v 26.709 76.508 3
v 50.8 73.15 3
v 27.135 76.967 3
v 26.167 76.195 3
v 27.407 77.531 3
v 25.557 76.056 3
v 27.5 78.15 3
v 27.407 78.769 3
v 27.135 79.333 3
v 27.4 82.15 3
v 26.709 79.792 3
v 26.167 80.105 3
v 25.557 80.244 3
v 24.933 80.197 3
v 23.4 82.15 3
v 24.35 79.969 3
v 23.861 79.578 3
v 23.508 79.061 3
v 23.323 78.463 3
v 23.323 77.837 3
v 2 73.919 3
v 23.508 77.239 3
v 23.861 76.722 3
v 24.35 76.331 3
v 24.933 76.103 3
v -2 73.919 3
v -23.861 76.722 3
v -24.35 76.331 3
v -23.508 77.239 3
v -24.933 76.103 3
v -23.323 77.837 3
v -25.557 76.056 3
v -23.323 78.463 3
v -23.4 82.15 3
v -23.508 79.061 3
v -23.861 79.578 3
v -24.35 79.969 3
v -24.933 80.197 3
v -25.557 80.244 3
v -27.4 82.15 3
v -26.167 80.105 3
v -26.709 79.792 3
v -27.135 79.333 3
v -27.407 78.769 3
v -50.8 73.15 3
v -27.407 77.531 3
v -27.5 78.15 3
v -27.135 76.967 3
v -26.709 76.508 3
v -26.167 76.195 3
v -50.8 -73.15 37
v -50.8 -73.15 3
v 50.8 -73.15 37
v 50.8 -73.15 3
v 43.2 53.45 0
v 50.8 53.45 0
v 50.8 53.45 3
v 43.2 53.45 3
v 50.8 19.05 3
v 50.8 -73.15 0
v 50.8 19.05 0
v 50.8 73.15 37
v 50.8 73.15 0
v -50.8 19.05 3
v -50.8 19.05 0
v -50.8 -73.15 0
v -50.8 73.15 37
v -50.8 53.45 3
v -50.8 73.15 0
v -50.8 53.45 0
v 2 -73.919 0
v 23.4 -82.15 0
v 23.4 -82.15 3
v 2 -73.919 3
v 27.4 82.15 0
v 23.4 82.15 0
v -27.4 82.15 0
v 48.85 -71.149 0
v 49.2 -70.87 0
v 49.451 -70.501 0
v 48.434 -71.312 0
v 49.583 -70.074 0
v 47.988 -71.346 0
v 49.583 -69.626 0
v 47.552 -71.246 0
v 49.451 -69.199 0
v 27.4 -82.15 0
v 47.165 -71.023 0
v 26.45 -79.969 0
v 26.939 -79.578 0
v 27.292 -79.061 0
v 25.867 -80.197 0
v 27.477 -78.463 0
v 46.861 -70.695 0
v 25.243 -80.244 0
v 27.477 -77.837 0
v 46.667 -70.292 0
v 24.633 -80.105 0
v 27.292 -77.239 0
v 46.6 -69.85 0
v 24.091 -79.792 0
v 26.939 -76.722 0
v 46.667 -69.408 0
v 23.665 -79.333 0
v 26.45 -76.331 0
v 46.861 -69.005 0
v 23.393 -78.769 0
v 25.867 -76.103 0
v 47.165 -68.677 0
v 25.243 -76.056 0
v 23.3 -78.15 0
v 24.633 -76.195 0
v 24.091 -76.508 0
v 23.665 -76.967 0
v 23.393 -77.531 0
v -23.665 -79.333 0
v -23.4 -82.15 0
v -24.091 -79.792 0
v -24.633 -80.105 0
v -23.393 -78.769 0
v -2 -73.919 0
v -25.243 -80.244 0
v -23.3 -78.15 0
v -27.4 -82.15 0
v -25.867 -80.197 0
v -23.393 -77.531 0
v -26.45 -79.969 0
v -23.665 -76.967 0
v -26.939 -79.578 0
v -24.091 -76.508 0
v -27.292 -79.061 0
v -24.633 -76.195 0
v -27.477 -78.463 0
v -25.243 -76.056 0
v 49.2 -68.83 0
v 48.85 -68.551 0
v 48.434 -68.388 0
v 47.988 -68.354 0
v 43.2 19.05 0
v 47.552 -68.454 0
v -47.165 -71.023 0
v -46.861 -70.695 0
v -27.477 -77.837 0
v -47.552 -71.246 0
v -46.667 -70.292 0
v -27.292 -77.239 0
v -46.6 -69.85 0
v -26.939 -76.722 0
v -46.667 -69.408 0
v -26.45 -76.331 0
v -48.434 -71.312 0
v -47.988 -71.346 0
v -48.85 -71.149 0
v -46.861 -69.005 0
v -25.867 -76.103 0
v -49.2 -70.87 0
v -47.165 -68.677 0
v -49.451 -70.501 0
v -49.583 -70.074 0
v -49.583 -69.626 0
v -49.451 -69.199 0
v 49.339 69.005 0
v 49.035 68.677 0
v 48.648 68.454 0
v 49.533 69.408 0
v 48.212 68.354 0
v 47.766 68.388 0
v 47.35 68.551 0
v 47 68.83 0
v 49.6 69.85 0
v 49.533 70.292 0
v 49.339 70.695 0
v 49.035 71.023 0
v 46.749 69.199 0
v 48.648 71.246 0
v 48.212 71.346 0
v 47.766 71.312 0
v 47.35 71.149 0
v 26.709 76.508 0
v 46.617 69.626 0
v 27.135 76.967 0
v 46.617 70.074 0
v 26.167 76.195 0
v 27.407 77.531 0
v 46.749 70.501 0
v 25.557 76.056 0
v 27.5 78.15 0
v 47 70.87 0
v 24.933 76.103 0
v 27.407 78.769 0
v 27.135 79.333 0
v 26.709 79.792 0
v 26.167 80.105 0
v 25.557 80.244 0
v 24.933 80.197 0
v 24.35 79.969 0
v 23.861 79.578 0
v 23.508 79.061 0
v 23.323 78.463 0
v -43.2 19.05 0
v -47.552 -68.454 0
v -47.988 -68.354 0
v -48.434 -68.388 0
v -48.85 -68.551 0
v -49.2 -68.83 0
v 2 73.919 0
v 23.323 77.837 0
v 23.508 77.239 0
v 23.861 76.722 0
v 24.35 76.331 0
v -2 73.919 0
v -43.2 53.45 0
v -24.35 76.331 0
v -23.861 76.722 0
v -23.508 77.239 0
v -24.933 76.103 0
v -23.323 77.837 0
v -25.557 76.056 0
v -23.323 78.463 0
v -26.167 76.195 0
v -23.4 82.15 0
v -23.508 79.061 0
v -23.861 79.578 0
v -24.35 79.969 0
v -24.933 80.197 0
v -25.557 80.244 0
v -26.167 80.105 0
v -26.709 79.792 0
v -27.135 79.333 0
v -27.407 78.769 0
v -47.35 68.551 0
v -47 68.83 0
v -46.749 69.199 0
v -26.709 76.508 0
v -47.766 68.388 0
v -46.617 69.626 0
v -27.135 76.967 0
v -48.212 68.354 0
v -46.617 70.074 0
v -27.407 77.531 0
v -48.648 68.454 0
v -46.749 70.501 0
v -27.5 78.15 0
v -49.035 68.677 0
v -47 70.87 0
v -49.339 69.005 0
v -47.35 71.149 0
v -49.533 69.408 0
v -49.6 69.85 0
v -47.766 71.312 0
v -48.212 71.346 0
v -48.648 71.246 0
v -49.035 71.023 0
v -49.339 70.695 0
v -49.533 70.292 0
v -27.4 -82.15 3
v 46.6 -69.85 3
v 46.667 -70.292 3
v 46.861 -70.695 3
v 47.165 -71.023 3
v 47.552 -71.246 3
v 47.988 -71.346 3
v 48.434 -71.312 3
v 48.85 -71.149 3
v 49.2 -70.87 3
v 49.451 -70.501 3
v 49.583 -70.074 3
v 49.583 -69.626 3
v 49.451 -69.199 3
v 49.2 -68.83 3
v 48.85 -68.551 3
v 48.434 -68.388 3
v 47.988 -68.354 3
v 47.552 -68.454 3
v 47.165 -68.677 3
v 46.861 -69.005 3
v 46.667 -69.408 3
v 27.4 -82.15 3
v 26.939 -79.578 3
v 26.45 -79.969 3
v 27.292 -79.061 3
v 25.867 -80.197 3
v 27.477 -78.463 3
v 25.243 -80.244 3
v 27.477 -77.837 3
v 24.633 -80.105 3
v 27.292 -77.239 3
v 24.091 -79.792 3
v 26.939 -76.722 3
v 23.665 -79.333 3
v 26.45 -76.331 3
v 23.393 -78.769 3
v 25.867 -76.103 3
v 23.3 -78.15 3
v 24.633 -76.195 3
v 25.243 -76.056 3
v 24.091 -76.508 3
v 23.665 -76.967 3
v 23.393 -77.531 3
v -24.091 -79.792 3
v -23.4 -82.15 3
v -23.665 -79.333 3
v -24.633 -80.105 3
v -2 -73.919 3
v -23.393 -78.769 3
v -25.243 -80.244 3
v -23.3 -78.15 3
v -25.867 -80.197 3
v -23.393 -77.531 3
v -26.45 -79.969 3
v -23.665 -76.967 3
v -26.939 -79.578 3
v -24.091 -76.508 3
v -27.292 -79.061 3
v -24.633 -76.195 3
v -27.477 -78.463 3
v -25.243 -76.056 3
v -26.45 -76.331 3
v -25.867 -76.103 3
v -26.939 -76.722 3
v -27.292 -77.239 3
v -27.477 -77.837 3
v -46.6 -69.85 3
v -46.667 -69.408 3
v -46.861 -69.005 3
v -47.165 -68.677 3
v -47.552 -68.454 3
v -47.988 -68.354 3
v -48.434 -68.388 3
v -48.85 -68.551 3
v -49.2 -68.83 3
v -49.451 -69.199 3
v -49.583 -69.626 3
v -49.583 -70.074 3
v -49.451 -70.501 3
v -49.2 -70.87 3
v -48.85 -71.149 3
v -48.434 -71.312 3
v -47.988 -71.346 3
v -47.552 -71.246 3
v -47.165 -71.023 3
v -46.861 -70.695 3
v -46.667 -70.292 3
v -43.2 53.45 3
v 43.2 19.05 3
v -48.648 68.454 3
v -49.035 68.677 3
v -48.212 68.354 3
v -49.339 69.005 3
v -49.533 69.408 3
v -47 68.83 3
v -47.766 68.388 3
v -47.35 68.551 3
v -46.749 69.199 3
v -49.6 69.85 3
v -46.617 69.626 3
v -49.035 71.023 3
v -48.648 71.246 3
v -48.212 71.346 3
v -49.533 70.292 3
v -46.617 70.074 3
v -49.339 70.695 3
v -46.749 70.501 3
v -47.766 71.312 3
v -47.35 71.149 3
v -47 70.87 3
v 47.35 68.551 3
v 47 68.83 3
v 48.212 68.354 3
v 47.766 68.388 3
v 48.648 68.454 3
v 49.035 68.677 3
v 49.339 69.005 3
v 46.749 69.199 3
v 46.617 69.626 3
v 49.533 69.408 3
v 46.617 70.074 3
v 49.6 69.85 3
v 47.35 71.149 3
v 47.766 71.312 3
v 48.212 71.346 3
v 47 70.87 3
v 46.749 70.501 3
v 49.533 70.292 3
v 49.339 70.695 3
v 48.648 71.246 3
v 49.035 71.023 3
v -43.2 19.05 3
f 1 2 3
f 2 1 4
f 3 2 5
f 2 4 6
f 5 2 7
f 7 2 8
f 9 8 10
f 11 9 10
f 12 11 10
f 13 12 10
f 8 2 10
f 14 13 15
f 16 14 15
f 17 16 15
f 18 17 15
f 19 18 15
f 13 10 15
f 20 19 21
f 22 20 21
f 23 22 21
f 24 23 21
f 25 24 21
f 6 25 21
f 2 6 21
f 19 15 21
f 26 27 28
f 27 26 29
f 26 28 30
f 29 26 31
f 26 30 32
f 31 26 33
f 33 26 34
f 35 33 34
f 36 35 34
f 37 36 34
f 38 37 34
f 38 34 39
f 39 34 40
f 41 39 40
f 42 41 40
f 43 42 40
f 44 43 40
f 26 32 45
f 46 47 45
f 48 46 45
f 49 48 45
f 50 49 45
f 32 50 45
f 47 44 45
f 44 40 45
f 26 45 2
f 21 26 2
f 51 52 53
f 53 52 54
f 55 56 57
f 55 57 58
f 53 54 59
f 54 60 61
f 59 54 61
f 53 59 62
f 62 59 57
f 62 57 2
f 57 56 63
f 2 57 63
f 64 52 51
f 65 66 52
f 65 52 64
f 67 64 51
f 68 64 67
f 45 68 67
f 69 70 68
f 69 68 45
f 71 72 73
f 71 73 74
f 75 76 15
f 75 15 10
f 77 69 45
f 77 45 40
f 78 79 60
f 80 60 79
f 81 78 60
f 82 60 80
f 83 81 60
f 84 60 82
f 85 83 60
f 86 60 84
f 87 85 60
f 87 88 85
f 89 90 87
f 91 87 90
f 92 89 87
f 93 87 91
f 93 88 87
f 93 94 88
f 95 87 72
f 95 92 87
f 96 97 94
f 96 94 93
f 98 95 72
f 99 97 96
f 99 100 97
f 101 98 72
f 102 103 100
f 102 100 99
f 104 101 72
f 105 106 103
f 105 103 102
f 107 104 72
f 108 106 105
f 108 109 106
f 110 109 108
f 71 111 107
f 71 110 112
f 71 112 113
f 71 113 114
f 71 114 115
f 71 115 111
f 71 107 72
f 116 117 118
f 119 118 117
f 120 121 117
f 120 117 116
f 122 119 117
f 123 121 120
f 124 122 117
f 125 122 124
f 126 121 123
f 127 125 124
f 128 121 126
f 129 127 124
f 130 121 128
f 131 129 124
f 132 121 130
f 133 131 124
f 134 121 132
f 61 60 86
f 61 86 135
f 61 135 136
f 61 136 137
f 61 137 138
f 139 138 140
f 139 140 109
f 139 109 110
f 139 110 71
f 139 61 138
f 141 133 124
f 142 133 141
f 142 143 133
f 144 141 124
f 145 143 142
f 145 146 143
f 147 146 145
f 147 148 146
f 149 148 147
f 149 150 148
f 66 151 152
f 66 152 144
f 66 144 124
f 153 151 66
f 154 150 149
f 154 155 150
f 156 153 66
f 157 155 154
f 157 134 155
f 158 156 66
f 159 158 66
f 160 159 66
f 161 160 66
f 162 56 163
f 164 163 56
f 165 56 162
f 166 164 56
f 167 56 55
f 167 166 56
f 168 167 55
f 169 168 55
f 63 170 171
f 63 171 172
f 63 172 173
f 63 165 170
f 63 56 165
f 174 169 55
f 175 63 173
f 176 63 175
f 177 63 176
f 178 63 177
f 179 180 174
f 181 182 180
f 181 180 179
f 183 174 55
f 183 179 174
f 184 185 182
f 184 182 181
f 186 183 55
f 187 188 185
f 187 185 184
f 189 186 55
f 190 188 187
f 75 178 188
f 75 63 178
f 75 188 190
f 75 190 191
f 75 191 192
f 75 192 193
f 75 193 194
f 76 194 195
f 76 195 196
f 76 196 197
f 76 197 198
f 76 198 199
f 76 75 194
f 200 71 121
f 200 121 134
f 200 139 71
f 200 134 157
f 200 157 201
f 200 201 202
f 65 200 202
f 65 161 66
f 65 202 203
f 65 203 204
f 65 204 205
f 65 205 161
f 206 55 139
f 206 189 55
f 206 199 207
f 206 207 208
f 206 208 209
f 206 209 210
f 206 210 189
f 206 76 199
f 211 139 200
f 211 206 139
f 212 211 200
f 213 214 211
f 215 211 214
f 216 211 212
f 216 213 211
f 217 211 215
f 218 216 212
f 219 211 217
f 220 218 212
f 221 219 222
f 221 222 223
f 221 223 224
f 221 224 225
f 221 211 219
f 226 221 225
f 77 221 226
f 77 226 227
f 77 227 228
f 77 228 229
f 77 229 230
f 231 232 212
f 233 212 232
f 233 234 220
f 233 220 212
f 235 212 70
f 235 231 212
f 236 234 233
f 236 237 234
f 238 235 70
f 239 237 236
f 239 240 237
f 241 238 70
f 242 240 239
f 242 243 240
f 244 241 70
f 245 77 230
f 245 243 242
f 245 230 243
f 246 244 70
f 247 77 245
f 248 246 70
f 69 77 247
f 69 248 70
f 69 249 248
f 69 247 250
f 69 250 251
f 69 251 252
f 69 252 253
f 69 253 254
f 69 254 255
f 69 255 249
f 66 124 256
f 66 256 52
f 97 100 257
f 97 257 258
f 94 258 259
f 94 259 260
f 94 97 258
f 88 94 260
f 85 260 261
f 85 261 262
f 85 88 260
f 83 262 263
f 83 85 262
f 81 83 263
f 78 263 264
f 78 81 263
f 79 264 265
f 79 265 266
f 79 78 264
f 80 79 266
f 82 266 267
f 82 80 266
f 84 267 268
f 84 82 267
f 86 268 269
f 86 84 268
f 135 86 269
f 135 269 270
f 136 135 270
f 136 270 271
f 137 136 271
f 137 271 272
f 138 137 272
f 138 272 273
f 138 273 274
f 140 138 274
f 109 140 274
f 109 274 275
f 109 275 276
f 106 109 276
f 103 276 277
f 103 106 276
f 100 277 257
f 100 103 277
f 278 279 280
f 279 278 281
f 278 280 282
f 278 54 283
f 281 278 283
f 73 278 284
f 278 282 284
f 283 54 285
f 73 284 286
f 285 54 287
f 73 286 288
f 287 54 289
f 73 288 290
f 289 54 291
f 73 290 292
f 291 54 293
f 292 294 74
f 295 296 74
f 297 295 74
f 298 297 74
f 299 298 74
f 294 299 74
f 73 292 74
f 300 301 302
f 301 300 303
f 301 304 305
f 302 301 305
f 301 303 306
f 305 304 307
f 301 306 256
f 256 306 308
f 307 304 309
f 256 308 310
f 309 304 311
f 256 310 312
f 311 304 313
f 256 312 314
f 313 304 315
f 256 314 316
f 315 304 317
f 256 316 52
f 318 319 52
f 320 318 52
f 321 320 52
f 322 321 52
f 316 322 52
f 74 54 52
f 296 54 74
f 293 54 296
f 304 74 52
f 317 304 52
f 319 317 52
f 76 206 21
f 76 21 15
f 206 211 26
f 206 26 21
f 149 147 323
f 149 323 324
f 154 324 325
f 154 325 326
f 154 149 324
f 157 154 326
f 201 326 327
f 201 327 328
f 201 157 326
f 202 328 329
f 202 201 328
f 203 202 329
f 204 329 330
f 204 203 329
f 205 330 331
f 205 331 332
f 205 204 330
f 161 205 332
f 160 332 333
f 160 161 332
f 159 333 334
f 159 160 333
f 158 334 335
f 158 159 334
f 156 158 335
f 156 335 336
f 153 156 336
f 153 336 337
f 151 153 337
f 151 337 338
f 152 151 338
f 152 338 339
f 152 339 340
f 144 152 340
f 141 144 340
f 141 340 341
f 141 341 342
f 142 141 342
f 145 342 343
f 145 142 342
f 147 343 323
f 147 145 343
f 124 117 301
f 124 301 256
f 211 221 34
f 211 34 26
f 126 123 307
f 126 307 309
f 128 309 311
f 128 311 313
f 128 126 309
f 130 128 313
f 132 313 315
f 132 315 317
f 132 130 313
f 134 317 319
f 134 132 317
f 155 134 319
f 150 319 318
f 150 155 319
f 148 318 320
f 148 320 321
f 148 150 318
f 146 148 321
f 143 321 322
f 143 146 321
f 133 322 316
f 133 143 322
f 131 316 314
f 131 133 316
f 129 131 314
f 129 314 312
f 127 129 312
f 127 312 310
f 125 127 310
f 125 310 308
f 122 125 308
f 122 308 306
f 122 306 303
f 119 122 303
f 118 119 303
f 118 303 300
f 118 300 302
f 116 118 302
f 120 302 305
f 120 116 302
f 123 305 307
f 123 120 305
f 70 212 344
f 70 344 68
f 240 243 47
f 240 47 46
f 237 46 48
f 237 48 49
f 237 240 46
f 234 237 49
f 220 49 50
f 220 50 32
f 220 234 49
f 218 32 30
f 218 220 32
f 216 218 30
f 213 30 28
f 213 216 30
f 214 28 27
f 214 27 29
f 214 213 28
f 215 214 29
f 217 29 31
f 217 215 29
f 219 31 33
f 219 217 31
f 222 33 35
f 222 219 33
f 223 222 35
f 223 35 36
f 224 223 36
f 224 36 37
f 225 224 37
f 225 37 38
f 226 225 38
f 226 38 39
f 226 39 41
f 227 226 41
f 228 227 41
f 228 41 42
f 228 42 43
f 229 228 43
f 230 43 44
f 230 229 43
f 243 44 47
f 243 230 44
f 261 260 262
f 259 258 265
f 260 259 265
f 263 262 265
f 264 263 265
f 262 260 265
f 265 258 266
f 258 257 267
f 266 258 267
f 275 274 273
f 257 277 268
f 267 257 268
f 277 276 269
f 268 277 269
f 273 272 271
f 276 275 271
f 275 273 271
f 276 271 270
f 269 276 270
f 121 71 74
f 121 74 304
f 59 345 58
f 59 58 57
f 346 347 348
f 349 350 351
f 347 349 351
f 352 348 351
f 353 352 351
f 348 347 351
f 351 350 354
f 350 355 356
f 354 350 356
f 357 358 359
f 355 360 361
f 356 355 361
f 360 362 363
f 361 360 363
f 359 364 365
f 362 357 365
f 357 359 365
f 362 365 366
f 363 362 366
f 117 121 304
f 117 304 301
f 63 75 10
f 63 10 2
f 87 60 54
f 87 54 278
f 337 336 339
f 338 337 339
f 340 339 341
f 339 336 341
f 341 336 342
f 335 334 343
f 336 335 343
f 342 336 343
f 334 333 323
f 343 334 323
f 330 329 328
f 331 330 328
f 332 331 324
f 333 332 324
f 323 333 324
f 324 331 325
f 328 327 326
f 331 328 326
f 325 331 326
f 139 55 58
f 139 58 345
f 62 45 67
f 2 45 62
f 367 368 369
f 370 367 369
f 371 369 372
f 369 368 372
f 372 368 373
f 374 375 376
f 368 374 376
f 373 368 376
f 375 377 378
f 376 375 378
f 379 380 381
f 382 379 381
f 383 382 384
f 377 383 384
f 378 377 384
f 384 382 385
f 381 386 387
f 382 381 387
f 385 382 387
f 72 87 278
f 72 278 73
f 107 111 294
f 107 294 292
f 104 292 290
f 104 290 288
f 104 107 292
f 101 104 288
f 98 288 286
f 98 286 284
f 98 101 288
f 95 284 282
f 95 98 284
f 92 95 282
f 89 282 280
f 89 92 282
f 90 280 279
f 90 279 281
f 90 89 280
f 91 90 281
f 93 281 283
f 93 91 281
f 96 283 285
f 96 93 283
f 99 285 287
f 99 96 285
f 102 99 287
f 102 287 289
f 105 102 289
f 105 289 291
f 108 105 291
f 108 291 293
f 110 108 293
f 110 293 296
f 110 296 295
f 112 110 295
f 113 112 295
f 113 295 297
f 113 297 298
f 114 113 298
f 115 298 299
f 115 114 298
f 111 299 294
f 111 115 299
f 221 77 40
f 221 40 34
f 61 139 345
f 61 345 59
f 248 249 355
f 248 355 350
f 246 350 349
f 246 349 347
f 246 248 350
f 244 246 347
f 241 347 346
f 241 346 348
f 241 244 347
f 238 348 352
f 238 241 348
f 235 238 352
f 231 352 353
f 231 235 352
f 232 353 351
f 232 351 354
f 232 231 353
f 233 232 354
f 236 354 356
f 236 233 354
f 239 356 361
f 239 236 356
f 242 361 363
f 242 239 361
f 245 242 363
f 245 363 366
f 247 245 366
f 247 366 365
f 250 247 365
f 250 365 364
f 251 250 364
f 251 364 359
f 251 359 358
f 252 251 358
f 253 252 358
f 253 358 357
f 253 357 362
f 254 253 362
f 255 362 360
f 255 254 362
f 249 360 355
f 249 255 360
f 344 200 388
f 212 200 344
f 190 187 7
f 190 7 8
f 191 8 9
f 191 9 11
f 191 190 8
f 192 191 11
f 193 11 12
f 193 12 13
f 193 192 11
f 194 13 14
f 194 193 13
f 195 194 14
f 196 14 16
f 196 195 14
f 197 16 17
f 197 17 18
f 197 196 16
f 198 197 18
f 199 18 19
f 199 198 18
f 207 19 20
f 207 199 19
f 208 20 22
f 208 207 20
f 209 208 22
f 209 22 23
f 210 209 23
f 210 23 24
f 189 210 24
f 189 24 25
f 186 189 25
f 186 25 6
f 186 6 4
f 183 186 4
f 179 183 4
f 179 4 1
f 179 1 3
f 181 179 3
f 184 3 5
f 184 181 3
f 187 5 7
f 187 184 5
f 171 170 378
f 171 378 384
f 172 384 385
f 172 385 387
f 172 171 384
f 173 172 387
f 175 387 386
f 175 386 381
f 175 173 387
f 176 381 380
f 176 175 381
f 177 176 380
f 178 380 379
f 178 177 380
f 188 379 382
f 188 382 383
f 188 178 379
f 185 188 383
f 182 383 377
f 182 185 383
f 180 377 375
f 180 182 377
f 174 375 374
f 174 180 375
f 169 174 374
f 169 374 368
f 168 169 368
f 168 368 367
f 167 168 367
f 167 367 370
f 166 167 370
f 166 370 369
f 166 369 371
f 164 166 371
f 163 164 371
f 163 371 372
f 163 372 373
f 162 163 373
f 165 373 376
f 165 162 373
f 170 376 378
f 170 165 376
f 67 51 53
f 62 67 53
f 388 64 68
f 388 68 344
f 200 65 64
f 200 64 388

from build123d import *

# Parameters (mm, degrees)
ESQUISSE1_R        = 2.1
ESQUISSE1_R_2      = 1.5
BOSS_EXTRU_1_DEPTH = 3
ESQUISSE2_W        = 101.6
ESQUISSE2_H        = 146.3
BOSS_EXTRU_2_DEPTH = 34


with BuildPart() as part:
    # Esquisse1 → Boss.-Extru.1 (new body)
    with BuildSketch(Plane.XY):
        Polygon((-50.8, 73.15), (-27.4, 82.15), (-23.4, 82.15), (-2, 73.919230769), (2, 73.919230769), (23.4, 82.15), (27.4, 82.15), (50.8, 73.15), (50.8, 53.45), (43.2, 53.45), (43.2, 19.05), (50.8, 19.05), (50.8, -73.15), (27.4, -82.15), (23.4, -82.15), (2, -73.919230769), (-2, -73.919230769), (-23.4, -82.15), (-27.4, -82.15), (-50.8, -73.15), (-50.8, 19.05), (-43.2, 19.05), (-43.2, 53.45), (-50.8, 53.45), align=None)
        with Locations((-25.4, -78.15)):
            Circle(ESQUISSE1_R, mode=Mode.SUBTRACT)
        with Locations(Location((25.4, -78.15, 0), (0, 0, 180))):
            Circle(ESQUISSE1_R, mode=Mode.SUBTRACT)
        with Locations(Location((-25.4, 78.15, 0), (0, 0, 180))):
            Circle(ESQUISSE1_R, mode=Mode.SUBTRACT)
        with Locations((25.4, 78.15)):
            Circle(ESQUISSE1_R, mode=Mode.SUBTRACT)
        with Locations((-48.1, -69.85)):
            Circle(ESQUISSE1_R_2, mode=Mode.SUBTRACT)
        with Locations(Location((48.1, -69.85, 0), (0, 0, 180))):
            Circle(ESQUISSE1_R_2, mode=Mode.SUBTRACT)
        with Locations(Location((-48.1, 69.85, 0), (0, 0, 180))):
            Circle(ESQUISSE1_R_2, mode=Mode.SUBTRACT)
        with Locations((48.1, 69.85)):
            Circle(ESQUISSE1_R_2, mode=Mode.SUBTRACT)
    extrude(amount=BOSS_EXTRU_1_DEPTH)

    # Esquisse2 → Boss.-Extru.2 (add)
    with BuildSketch(Plane.XY.offset(3)):
        Rectangle(ESQUISSE2_W, ESQUISSE2_H)
    extrude(amount=BOSS_EXTRU_2_DEPTH)


solid = part.part
